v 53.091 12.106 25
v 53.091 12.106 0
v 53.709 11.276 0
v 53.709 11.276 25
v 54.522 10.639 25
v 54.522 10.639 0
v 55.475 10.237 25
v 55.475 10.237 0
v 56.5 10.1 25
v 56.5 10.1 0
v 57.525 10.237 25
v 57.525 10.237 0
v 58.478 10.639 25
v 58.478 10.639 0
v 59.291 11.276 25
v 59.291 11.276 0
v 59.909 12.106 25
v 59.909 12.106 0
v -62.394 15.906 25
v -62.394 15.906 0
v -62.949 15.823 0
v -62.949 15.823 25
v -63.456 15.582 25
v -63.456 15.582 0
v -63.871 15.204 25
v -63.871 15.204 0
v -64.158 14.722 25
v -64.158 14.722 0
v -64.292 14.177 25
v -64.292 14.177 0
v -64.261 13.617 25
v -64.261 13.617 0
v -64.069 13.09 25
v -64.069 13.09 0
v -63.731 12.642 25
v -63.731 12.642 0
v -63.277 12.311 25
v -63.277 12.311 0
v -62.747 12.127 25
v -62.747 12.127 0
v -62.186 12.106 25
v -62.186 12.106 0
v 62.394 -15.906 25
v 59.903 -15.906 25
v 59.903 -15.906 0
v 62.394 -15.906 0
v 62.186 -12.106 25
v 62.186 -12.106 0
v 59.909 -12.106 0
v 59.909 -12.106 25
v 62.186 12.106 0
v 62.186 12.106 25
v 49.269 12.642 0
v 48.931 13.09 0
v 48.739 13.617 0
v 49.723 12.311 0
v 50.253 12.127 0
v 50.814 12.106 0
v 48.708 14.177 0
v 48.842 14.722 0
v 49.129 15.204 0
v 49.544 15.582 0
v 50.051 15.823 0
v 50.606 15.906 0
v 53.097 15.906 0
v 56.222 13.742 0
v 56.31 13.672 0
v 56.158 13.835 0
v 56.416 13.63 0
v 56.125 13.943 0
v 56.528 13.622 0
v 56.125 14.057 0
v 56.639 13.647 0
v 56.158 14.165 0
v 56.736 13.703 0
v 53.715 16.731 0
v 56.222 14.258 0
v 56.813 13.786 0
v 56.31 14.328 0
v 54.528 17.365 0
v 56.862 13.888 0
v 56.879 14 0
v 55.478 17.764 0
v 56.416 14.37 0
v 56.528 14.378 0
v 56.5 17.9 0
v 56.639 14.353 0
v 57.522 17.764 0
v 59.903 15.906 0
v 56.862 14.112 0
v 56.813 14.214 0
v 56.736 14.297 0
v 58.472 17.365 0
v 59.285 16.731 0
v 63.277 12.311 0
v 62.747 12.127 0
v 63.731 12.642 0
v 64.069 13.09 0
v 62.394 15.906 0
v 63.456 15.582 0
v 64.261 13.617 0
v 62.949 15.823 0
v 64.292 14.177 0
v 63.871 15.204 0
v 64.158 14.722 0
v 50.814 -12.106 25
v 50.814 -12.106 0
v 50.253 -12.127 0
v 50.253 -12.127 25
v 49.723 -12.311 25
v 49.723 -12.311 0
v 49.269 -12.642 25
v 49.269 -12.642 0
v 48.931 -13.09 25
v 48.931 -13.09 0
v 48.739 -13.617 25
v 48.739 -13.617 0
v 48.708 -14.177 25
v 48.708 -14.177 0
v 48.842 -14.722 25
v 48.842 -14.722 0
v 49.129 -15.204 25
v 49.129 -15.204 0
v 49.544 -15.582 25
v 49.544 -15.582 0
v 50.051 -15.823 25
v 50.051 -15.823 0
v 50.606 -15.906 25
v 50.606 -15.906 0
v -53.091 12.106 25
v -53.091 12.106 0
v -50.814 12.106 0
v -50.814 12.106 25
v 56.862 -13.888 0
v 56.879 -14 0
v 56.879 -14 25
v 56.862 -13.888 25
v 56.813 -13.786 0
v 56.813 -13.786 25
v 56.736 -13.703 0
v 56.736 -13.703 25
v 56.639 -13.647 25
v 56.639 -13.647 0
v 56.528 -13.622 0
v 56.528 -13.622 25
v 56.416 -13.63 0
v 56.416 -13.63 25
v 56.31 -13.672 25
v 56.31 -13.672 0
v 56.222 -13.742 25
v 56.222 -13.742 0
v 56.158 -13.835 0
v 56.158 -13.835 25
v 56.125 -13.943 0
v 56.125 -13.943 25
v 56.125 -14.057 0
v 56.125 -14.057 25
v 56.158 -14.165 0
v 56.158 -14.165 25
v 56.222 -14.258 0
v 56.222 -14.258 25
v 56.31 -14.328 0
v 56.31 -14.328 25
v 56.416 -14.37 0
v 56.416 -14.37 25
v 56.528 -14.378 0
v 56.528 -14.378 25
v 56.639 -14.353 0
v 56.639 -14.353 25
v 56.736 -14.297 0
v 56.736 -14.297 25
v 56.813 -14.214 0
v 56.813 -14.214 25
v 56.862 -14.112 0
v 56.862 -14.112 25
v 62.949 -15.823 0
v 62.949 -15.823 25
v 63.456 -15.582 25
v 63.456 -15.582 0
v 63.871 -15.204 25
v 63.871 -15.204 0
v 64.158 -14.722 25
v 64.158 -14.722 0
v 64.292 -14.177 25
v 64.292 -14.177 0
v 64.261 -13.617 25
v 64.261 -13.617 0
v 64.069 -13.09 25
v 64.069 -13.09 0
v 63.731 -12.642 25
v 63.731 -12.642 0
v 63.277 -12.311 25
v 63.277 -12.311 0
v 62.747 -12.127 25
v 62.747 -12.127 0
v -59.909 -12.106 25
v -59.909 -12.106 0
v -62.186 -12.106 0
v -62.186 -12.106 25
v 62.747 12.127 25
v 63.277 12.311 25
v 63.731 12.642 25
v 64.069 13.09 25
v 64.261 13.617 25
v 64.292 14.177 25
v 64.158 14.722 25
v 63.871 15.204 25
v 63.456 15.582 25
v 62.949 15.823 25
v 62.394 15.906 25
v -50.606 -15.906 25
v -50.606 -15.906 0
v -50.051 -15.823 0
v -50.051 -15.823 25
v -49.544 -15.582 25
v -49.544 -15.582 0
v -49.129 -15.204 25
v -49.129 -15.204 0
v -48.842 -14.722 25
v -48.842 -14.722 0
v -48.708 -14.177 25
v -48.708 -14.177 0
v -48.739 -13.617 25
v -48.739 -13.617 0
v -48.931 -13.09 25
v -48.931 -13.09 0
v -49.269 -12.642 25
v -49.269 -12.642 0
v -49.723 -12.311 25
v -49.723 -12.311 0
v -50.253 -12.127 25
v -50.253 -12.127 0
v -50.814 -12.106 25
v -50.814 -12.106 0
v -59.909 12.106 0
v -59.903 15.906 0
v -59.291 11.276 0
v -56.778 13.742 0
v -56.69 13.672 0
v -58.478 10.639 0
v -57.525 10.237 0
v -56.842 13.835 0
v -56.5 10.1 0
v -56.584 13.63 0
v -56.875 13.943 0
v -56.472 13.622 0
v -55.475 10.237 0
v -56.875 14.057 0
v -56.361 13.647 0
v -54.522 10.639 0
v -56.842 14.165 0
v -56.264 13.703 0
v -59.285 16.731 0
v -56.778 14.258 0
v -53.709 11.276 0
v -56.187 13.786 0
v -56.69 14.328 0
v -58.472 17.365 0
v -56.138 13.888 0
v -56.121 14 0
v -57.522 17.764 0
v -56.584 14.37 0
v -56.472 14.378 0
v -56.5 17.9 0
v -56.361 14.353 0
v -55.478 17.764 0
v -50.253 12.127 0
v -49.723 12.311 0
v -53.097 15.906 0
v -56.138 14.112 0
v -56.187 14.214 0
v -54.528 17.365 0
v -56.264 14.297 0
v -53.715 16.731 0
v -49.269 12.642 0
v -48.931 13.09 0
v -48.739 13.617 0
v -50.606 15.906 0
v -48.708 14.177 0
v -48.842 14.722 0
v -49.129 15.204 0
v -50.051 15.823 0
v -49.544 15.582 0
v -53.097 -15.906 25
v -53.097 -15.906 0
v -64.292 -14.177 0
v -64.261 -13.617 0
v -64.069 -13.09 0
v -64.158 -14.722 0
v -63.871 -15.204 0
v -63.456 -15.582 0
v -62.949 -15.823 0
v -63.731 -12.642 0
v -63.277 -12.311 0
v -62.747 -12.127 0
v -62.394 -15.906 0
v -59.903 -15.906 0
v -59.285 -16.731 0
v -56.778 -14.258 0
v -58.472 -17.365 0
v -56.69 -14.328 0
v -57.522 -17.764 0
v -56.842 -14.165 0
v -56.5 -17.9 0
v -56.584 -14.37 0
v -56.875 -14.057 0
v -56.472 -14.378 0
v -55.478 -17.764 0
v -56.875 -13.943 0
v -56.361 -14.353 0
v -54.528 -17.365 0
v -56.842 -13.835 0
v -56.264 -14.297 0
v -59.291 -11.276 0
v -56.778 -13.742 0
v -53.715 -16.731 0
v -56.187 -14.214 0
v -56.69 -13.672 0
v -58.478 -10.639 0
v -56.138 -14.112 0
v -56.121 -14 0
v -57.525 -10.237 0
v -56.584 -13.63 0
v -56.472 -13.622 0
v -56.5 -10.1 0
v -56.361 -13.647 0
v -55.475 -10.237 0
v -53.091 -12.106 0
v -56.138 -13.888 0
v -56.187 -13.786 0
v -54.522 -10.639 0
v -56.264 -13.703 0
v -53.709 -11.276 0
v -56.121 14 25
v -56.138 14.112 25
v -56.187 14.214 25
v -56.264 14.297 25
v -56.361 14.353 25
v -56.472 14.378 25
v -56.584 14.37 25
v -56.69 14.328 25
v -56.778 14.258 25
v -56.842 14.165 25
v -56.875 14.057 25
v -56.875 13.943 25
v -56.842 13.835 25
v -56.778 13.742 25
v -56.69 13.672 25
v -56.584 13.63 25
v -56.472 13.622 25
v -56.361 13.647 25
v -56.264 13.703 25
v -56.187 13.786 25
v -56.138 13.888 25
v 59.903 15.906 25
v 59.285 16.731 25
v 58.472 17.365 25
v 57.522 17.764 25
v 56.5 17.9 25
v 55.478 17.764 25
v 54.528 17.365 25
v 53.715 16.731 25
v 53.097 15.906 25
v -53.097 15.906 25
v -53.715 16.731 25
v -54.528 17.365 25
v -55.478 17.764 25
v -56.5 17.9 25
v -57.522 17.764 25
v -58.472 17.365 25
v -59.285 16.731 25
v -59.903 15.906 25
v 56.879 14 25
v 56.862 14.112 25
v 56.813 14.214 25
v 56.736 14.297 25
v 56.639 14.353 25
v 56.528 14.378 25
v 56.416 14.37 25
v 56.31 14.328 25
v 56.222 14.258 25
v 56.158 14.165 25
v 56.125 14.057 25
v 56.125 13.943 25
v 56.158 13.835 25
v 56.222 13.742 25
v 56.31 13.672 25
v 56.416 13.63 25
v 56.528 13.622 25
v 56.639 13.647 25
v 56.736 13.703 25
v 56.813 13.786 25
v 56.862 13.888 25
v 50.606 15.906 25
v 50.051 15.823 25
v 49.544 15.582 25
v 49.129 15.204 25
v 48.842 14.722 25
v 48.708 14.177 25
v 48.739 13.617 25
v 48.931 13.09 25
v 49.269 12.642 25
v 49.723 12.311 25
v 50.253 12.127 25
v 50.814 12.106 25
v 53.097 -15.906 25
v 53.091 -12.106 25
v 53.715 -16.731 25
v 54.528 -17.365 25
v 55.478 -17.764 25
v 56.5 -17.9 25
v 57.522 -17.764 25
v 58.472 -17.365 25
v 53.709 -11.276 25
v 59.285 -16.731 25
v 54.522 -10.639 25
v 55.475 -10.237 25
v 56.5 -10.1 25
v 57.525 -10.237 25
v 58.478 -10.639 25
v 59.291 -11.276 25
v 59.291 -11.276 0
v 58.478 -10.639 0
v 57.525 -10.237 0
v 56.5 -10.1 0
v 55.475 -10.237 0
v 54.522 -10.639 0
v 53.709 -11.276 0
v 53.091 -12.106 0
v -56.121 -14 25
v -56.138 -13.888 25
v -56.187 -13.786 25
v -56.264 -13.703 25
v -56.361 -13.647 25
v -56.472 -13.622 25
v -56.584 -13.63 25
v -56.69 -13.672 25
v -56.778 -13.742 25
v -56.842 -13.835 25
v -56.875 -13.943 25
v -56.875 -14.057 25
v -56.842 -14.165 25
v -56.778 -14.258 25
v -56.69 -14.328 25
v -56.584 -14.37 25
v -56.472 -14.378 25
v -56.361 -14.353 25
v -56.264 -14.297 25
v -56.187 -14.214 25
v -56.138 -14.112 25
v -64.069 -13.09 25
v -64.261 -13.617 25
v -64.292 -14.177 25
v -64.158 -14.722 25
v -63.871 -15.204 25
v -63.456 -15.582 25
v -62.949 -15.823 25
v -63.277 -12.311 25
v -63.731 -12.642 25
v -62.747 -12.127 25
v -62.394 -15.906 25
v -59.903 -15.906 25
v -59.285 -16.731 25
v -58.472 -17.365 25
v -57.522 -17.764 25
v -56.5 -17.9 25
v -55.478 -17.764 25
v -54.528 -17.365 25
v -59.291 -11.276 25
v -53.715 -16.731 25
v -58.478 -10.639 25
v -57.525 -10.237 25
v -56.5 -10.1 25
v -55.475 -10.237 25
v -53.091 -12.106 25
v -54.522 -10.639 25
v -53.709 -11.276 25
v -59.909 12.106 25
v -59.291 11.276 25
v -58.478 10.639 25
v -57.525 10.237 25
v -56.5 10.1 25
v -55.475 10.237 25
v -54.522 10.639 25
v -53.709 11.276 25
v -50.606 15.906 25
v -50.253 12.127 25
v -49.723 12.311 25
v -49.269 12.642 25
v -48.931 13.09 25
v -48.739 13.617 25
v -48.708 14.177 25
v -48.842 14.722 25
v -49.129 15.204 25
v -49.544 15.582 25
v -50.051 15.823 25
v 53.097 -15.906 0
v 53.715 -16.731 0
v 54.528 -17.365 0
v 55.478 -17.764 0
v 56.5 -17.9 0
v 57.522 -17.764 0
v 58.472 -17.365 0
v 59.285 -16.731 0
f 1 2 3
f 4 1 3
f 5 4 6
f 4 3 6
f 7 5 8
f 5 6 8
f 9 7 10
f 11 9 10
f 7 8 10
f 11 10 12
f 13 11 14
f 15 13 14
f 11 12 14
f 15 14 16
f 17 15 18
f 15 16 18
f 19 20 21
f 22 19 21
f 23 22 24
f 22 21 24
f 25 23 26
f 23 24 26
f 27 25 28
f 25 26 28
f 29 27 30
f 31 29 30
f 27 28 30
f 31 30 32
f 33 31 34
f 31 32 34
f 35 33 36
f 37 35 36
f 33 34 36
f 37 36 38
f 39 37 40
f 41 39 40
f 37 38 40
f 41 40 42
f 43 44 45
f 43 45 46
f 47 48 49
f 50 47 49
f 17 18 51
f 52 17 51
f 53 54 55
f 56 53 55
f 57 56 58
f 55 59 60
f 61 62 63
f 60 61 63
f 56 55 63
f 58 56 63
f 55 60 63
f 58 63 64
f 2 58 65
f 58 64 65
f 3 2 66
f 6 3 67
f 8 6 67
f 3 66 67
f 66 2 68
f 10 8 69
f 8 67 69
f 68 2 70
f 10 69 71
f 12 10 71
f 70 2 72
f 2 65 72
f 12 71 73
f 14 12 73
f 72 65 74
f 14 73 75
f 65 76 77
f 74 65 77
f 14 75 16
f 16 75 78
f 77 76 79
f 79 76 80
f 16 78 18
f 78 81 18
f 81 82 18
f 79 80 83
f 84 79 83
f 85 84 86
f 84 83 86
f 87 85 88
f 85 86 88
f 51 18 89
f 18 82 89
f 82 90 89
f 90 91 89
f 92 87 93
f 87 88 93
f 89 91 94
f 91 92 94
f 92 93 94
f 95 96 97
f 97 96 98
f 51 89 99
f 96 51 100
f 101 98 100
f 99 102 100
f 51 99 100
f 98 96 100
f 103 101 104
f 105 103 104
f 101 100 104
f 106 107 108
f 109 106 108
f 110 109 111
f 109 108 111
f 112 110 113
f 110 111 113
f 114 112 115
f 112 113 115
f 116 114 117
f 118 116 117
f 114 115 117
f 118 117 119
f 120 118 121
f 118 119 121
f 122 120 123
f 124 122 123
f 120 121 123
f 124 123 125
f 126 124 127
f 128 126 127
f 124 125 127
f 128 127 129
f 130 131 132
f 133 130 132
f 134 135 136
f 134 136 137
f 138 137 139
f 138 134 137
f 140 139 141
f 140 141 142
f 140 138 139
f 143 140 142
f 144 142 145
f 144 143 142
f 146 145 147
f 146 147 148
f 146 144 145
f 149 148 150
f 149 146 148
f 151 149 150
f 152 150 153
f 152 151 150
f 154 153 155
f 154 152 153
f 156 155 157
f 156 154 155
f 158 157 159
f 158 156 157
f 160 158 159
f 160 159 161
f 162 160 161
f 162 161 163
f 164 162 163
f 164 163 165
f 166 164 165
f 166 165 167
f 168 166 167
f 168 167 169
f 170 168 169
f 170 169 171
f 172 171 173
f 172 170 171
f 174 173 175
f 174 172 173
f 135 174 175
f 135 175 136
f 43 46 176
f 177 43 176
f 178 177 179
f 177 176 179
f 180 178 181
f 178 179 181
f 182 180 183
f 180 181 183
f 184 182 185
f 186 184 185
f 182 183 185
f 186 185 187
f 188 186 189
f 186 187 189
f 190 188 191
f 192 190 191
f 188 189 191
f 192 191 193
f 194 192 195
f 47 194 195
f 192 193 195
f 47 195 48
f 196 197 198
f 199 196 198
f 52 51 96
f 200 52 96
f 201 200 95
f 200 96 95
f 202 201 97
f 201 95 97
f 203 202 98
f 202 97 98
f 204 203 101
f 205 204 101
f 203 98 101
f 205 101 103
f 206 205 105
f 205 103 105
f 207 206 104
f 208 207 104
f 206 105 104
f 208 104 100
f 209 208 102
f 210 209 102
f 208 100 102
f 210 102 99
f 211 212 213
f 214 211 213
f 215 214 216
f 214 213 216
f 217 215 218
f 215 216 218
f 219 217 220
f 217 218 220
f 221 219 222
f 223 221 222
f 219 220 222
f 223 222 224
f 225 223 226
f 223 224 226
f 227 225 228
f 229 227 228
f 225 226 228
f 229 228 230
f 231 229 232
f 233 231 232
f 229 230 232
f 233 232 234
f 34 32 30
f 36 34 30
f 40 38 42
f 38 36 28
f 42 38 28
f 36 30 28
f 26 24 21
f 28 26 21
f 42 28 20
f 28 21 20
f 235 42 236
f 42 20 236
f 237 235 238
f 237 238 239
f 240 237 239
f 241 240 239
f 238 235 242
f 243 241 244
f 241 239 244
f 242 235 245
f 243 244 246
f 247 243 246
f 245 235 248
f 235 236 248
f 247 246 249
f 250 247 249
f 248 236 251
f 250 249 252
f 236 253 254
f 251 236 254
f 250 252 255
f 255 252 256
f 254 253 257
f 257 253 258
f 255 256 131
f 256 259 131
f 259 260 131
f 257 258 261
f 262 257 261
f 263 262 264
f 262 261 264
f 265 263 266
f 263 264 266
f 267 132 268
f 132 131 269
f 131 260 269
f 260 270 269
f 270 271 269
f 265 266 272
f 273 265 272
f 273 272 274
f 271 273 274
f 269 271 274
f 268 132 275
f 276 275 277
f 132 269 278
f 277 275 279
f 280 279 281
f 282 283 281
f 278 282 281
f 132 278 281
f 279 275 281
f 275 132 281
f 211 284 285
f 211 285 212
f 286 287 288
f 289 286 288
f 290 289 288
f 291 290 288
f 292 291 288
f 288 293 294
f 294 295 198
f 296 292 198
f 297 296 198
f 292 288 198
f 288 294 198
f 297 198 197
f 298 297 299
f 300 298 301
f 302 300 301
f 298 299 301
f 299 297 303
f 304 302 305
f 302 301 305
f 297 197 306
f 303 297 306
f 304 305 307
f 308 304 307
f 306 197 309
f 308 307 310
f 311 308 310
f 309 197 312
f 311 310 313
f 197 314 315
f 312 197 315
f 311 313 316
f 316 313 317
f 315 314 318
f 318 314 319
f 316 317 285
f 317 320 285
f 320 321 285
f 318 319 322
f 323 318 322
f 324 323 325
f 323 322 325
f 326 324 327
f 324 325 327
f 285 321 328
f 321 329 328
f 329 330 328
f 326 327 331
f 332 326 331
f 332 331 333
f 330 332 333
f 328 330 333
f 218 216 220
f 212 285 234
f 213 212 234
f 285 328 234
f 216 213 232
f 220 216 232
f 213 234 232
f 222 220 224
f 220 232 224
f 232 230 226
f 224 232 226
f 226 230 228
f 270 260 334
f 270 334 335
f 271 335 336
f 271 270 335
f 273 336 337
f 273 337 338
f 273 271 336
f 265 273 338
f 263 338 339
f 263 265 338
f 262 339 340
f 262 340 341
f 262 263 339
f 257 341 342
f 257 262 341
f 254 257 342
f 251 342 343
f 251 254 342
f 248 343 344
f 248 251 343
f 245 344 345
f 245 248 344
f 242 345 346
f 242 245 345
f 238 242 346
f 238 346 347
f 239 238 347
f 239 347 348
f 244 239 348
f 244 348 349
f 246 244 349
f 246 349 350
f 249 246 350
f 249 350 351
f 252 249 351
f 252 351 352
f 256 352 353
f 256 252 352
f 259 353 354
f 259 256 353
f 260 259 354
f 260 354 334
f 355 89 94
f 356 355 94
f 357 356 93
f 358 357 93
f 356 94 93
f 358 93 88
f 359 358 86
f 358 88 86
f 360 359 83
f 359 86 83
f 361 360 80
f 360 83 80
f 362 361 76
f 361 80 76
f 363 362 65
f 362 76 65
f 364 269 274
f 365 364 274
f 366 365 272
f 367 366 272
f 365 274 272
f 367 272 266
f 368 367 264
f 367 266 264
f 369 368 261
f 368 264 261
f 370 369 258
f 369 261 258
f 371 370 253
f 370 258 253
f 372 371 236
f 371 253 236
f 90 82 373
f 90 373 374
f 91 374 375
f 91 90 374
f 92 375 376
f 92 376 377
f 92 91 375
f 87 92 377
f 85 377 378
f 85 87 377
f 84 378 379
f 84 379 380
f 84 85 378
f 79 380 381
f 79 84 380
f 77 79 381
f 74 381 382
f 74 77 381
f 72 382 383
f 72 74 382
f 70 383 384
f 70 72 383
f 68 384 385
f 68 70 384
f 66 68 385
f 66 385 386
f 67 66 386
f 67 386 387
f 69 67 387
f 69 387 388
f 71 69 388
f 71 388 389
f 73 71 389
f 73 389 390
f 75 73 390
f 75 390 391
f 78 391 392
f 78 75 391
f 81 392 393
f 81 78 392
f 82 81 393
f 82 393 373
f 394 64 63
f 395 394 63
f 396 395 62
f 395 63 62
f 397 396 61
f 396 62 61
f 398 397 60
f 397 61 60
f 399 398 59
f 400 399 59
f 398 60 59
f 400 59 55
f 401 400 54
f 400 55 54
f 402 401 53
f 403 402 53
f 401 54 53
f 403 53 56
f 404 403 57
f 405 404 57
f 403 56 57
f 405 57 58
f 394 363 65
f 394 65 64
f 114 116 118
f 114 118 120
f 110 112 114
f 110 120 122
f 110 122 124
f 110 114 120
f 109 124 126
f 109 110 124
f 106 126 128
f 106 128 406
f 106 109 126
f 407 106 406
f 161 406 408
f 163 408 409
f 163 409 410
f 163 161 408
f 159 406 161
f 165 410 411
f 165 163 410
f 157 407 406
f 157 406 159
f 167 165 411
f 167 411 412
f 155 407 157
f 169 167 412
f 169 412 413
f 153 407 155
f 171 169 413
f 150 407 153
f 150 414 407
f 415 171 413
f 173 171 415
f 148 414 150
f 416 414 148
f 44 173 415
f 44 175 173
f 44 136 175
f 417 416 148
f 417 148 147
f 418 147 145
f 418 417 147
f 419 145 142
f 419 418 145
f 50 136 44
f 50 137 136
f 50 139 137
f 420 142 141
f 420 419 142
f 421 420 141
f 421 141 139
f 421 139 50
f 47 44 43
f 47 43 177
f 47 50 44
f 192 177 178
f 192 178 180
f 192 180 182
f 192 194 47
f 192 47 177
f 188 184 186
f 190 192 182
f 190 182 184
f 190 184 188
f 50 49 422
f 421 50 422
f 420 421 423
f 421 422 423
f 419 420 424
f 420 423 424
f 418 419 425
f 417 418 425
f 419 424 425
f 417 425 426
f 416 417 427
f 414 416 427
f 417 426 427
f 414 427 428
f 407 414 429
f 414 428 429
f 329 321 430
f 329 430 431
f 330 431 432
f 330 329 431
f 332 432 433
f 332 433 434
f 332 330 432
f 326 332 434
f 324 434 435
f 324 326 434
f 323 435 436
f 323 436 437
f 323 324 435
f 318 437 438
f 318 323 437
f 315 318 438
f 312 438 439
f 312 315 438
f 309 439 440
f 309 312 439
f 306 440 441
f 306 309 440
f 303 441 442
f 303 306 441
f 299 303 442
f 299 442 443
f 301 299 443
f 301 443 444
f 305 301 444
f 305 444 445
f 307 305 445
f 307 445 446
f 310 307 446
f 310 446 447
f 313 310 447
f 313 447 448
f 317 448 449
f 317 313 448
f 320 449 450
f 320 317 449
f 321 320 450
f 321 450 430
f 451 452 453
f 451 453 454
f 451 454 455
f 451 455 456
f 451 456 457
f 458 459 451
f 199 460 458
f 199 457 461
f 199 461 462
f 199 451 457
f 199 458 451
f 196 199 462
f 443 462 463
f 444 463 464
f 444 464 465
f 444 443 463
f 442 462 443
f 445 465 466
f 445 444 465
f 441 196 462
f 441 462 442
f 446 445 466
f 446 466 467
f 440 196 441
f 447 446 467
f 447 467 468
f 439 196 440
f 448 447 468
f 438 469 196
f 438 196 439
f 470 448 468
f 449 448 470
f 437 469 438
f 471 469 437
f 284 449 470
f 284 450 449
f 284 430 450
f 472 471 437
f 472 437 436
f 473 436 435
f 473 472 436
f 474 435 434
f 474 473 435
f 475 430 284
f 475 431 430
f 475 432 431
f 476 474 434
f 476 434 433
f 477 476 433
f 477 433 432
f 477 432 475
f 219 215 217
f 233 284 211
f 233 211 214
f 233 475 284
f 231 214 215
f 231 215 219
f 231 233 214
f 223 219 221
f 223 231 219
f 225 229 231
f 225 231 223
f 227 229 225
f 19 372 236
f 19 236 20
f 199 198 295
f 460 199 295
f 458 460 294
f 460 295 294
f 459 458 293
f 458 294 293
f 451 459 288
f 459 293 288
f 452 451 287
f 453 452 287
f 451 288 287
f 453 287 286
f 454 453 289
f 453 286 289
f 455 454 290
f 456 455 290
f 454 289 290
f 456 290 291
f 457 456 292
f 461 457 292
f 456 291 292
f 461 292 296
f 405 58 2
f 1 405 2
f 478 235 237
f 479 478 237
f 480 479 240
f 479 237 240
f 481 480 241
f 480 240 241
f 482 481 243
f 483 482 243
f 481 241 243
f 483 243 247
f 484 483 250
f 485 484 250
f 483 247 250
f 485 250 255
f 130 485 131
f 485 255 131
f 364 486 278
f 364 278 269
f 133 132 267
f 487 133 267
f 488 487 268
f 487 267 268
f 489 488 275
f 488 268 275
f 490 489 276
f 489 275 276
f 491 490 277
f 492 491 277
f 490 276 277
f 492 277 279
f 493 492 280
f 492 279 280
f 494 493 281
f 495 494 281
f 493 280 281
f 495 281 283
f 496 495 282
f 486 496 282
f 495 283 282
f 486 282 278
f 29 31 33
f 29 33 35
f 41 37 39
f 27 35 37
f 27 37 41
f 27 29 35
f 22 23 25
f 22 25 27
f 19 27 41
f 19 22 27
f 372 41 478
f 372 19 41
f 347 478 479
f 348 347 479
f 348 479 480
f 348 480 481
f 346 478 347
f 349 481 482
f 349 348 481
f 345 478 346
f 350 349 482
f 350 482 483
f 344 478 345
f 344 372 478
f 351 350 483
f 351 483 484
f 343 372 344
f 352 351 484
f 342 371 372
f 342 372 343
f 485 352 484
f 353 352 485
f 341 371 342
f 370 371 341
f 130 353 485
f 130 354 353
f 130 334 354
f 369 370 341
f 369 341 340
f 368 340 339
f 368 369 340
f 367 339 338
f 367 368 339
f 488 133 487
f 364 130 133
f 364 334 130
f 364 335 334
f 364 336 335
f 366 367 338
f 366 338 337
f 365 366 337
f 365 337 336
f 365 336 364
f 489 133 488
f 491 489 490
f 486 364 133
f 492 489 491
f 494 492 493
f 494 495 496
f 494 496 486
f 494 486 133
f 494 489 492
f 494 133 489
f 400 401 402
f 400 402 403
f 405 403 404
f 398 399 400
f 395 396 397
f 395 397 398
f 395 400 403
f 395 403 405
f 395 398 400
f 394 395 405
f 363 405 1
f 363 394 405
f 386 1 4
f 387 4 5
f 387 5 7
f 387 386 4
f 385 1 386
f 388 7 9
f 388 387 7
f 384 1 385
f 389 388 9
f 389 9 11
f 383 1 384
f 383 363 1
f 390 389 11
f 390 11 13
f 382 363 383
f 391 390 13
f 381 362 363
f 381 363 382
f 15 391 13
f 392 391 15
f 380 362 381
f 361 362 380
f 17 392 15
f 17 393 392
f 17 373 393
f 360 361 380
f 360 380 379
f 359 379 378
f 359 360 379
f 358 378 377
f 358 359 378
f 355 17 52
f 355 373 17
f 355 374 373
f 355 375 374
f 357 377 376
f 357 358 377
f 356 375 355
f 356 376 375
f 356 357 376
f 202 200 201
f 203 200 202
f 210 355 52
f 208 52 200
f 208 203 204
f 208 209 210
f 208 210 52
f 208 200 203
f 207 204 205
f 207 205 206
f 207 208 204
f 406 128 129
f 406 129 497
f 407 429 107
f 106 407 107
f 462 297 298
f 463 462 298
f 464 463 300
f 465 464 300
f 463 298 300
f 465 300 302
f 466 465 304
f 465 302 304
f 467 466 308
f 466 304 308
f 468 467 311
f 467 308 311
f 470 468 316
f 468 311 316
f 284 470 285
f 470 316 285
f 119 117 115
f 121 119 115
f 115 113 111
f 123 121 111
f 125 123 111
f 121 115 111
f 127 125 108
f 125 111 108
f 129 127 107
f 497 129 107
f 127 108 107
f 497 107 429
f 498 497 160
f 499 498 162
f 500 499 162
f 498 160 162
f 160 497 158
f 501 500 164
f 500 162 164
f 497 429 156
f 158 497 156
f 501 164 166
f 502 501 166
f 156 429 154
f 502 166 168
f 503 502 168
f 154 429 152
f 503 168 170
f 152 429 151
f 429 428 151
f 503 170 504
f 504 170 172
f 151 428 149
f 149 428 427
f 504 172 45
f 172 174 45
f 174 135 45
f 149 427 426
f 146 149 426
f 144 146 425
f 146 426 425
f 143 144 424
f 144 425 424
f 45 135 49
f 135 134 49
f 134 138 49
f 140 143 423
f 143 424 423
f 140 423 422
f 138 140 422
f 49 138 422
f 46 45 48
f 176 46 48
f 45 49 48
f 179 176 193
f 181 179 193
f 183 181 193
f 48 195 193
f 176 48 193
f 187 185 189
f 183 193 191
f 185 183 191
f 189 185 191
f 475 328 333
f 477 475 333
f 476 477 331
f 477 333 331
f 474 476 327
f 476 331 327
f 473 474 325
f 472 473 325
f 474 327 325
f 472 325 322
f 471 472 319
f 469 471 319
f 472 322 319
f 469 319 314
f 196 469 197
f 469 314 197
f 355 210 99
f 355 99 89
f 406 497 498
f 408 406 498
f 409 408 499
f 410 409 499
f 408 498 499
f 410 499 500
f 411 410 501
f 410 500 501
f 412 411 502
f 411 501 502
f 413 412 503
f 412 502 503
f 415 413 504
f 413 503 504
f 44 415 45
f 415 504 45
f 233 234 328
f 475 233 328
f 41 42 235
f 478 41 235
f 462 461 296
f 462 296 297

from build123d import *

# Parameters (mm, degrees)
F0_R     = 0.379244
F1_DEPTH = 25


with BuildPart() as f1:
    # F0 (on Top) → F1 (new body)
    with BuildSketch(Plane.XY):
        with BuildLine():
            Line((-50.605683, 15.905683), (-53.097299, 15.905683))
            ThreePointArc((-53.097299, 15.905683), (-56.5, 17.9), (-59.902701, 15.905683))
            Line((-59.902701, 15.905683), (-62.394317, 15.905683))
            ThreePointArc((-62.394317, 15.905683), (-64.297156, 13.89593), (-62.186488, 12.105683))
            Line((-62.186488, 12.105683), (-59.909042, 12.105683))
            ThreePointArc((-59.909042, 12.105683), (-56.5, 10.1), (-53.090958, 12.105683))
            Line((-53.090958, 12.105683), (-50.813512, 12.105683))
            ThreePointArc((-50.813512, 12.105683), (-48.702844, 13.89593), (-50.605683, 15.905683))
        make_face()
        with Locations((-56.5, 14)):
            Circle(F0_R, mode=Mode.SUBTRACT)
        with BuildLine():
            ThreePointArc((-53.090958, -12.105683), (-56.5, -10.1), (-59.909042, -12.105683))
            ThreePointArc((-59.909042, -12.105683), (-60.399995, -14.006508), (-59.902701, -15.905683))
            ThreePointArc((-59.902701, -15.905683), (-56.5, -17.9), (-53.097299, -15.905683))
            ThreePointArc((-53.097299, -15.905683), (-52.726372, -14.984751), (-52.6, -14))
            ThreePointArc((-52.6, -14), (-52.724734, -13.021548), (-53.090958, -12.105683))
        make_face()
        with Locations((-56.5, -14)):
            Circle(F0_R, mode=Mode.SUBTRACT)
        with BuildLine():
            Line((-50.813512, -12.105683), (-53.090958, -12.105683))
            ThreePointArc((-53.090958, -12.105683), (-52.724734, -13.021548), (-52.6, -14))
            ThreePointArc((-52.6, -14), (-52.726372, -14.984751), (-53.097299, -15.905683))
            Line((-53.097299, -15.905683), (-50.605683, -15.905683))
            ThreePointArc((-50.605683, -15.905683), (-48.702844, -13.89593), (-50.813512, -12.105683))
        make_face()
        with BuildLine():
            ThreePointArc((-59.902701, -15.905683), (-60.399995, -14.006508), (-59.909042, -12.105683))
            Line((-59.909042, -12.105683), (-62.186488, -12.105683))
            ThreePointArc((-62.186488, -12.105683), (-64.297156, -13.89593), (-62.394317, -15.905683))
            Line((-62.394317, -15.905683), (-59.902701, -15.905683))
        make_face()
        with BuildLine():
            ThreePointArc((53.097299, -15.905683), (52.600005, -14.006508), (53.090958, -12.105683))
            Line((53.090958, -12.105683), (50.813512, -12.105683))
            ThreePointArc((50.813512, -12.105683), (48.702844, -13.89593), (50.605683, -15.905683))
            Line((50.605683, -15.905683), (53.097299, -15.905683))
        make_face()
        with BuildLine():
            ThreePointArc((59.909042, -12.105683), (56.5, -10.1), (53.090958, -12.105683))
            ThreePointArc((53.090958, -12.105683), (52.600005, -14.006508), (53.097299, -15.905683))
            ThreePointArc((53.097299, -15.905683), (56.5, -17.9), (59.902701, -15.905683))
            ThreePointArc((59.902701, -15.905683), (60.273628, -14.984751), (60.4, -14))
            ThreePointArc((60.4, -14), (60.275266, -13.021548), (59.909042, -12.105683))
        make_face()
        with Locations((56.5, -14)):
            Circle(F0_R, mode=Mode.SUBTRACT)
        with BuildLine():
            Line((62.186488, -12.105683), (59.909042, -12.105683))
            ThreePointArc((59.909042, -12.105683), (60.275266, -13.021548), (60.4, -14))
            ThreePointArc((60.4, -14), (60.273628, -14.984751), (59.902701, -15.905683))
            Line((59.902701, -15.905683), (62.394317, -15.905683))
            ThreePointArc((62.394317, -15.905683), (64.297156, -13.89593), (62.186488, -12.105683))
        make_face()
        with BuildLine():
            Line((62.394317, 15.905683), (59.902701, 15.905683))
            ThreePointArc((59.902701, 15.905683), (60.273628, 14.984751), (60.4, 14))
            ThreePointArc((60.4, 14), (60.275266, 13.021548), (59.909042, 12.105683))
            Line((59.909042, 12.105683), (62.186488, 12.105683))
            ThreePointArc((62.186488, 12.105683), (64.297156, 13.89593), (62.394317, 15.905683))
        make_face()
        with BuildLine():
            ThreePointArc((59.902701, 15.905683), (56.5, 17.9), (53.097299, 15.905683))
            ThreePointArc((53.097299, 15.905683), (52.600005, 14.006508), (53.090958, 12.105683))
            ThreePointArc((53.090958, 12.105683), (56.5, 10.1), (59.909042, 12.105683))
            ThreePointArc((59.909042, 12.105683), (60.275266, 13.021548), (60.4, 14))
            ThreePointArc((60.4, 14), (60.273628, 14.984751), (59.902701, 15.905683))
        make_face()
        with Locations((56.5, 14)):
            Circle(F0_R, mode=Mode.SUBTRACT)
        with BuildLine():
            ThreePointArc((53.090958, 12.105683), (52.600005, 14.006508), (53.097299, 15.905683))
            Line((53.097299, 15.905683), (50.605683, 15.905683))
            ThreePointArc((50.605683, 15.905683), (48.702844, 13.89593), (50.813512, 12.105683))
            Line((50.813512, 12.105683), (53.090958, 12.105683))
        make_face()
    extrude(amount=F1_DEPTH)


solid = f1.part
